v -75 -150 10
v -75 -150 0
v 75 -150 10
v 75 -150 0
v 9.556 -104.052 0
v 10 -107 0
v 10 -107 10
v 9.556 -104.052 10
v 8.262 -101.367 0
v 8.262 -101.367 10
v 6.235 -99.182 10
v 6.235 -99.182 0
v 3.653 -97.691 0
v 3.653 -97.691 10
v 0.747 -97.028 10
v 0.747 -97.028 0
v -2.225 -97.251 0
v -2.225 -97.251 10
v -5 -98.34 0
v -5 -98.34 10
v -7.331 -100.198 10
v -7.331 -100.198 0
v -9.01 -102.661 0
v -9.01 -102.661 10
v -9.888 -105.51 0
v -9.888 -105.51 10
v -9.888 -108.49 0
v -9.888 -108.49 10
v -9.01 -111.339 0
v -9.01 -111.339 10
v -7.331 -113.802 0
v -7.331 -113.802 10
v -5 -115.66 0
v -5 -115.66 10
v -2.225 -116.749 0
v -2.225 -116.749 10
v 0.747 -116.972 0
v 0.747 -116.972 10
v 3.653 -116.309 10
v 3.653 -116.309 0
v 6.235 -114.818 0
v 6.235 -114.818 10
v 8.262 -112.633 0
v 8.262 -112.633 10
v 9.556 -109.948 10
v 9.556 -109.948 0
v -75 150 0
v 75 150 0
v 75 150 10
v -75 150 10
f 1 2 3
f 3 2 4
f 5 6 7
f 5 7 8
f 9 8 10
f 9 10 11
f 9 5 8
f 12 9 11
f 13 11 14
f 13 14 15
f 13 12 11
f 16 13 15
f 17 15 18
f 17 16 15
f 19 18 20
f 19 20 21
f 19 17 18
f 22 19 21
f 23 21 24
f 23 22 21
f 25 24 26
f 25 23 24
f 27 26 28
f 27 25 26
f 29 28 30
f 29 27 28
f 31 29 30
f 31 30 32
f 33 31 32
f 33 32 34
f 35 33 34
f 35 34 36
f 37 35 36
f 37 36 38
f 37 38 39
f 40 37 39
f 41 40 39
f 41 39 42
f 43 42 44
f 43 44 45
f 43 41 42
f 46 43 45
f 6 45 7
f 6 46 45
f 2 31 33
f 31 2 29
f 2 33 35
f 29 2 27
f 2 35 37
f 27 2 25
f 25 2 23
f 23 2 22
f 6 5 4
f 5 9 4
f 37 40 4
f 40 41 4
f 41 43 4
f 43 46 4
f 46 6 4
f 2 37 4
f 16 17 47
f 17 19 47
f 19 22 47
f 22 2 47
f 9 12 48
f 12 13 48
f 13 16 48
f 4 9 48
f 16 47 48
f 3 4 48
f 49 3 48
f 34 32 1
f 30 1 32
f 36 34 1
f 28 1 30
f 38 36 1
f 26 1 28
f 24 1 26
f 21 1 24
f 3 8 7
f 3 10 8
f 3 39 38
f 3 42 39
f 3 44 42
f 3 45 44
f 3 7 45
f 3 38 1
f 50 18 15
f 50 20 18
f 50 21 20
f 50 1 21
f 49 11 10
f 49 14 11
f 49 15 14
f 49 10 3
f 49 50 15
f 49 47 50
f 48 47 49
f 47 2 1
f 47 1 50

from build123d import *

# Parameters (mm, degrees)
SKETCH1_W           = 150
SKETCH1_H           = 300
SKETCH1_R           = 10
BOSS_EXTRUDE1_DEPTH = 10


with BuildPart() as part:
    # Sketch1 → Boss-Extrude1 (new body)
    with BuildSketch(Plane.XY):
        Rectangle(SKETCH1_W, SKETCH1_H)
        with Locations((0, -107)):
            Circle(SKETCH1_R, mode=Mode.SUBTRACT)
    extrude(amount=BOSS_EXTRUDE1_DEPTH)


solid = part.part
